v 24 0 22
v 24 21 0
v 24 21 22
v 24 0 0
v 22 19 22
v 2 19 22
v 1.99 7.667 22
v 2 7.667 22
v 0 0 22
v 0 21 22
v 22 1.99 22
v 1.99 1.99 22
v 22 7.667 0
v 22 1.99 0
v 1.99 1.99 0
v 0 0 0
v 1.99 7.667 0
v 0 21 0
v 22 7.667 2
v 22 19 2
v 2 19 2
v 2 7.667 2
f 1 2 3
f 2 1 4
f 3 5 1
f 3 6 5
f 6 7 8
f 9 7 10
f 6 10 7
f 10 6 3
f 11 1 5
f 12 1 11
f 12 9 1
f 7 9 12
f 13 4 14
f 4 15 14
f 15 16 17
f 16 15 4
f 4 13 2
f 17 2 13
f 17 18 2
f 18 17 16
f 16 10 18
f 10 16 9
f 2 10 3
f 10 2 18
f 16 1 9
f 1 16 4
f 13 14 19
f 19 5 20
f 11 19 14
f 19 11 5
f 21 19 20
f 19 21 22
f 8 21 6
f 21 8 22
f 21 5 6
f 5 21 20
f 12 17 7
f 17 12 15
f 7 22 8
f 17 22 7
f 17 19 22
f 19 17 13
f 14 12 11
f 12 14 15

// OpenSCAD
// Author: Ciaran McDonald-Jensen
// Date: Mar 16, 2025
// CUHacking 2025 Base of Jumping Frog - fit test for DC Motor
// Start 0:40am




delta=0.01;

motorLength = 20;
motorWidth = 17;


// motorExtraLength = 8;
// motorExtraWidth = 1;
height = 22;

wallThickness = 2;
bottomThickness = 2;

difference(){
    cube([motorLength+2*wallThickness, motorWidth+2*wallThickness, height]);
    translate([wallThickness, wallThickness, bottomThickness]) cube([motorLength, motorWidth, height+100]);
    translate([wallThickness-delta,wallThickness-delta,-delta]) cube([motorLength+delta, motorWidth/3+delta, 100]);
}
